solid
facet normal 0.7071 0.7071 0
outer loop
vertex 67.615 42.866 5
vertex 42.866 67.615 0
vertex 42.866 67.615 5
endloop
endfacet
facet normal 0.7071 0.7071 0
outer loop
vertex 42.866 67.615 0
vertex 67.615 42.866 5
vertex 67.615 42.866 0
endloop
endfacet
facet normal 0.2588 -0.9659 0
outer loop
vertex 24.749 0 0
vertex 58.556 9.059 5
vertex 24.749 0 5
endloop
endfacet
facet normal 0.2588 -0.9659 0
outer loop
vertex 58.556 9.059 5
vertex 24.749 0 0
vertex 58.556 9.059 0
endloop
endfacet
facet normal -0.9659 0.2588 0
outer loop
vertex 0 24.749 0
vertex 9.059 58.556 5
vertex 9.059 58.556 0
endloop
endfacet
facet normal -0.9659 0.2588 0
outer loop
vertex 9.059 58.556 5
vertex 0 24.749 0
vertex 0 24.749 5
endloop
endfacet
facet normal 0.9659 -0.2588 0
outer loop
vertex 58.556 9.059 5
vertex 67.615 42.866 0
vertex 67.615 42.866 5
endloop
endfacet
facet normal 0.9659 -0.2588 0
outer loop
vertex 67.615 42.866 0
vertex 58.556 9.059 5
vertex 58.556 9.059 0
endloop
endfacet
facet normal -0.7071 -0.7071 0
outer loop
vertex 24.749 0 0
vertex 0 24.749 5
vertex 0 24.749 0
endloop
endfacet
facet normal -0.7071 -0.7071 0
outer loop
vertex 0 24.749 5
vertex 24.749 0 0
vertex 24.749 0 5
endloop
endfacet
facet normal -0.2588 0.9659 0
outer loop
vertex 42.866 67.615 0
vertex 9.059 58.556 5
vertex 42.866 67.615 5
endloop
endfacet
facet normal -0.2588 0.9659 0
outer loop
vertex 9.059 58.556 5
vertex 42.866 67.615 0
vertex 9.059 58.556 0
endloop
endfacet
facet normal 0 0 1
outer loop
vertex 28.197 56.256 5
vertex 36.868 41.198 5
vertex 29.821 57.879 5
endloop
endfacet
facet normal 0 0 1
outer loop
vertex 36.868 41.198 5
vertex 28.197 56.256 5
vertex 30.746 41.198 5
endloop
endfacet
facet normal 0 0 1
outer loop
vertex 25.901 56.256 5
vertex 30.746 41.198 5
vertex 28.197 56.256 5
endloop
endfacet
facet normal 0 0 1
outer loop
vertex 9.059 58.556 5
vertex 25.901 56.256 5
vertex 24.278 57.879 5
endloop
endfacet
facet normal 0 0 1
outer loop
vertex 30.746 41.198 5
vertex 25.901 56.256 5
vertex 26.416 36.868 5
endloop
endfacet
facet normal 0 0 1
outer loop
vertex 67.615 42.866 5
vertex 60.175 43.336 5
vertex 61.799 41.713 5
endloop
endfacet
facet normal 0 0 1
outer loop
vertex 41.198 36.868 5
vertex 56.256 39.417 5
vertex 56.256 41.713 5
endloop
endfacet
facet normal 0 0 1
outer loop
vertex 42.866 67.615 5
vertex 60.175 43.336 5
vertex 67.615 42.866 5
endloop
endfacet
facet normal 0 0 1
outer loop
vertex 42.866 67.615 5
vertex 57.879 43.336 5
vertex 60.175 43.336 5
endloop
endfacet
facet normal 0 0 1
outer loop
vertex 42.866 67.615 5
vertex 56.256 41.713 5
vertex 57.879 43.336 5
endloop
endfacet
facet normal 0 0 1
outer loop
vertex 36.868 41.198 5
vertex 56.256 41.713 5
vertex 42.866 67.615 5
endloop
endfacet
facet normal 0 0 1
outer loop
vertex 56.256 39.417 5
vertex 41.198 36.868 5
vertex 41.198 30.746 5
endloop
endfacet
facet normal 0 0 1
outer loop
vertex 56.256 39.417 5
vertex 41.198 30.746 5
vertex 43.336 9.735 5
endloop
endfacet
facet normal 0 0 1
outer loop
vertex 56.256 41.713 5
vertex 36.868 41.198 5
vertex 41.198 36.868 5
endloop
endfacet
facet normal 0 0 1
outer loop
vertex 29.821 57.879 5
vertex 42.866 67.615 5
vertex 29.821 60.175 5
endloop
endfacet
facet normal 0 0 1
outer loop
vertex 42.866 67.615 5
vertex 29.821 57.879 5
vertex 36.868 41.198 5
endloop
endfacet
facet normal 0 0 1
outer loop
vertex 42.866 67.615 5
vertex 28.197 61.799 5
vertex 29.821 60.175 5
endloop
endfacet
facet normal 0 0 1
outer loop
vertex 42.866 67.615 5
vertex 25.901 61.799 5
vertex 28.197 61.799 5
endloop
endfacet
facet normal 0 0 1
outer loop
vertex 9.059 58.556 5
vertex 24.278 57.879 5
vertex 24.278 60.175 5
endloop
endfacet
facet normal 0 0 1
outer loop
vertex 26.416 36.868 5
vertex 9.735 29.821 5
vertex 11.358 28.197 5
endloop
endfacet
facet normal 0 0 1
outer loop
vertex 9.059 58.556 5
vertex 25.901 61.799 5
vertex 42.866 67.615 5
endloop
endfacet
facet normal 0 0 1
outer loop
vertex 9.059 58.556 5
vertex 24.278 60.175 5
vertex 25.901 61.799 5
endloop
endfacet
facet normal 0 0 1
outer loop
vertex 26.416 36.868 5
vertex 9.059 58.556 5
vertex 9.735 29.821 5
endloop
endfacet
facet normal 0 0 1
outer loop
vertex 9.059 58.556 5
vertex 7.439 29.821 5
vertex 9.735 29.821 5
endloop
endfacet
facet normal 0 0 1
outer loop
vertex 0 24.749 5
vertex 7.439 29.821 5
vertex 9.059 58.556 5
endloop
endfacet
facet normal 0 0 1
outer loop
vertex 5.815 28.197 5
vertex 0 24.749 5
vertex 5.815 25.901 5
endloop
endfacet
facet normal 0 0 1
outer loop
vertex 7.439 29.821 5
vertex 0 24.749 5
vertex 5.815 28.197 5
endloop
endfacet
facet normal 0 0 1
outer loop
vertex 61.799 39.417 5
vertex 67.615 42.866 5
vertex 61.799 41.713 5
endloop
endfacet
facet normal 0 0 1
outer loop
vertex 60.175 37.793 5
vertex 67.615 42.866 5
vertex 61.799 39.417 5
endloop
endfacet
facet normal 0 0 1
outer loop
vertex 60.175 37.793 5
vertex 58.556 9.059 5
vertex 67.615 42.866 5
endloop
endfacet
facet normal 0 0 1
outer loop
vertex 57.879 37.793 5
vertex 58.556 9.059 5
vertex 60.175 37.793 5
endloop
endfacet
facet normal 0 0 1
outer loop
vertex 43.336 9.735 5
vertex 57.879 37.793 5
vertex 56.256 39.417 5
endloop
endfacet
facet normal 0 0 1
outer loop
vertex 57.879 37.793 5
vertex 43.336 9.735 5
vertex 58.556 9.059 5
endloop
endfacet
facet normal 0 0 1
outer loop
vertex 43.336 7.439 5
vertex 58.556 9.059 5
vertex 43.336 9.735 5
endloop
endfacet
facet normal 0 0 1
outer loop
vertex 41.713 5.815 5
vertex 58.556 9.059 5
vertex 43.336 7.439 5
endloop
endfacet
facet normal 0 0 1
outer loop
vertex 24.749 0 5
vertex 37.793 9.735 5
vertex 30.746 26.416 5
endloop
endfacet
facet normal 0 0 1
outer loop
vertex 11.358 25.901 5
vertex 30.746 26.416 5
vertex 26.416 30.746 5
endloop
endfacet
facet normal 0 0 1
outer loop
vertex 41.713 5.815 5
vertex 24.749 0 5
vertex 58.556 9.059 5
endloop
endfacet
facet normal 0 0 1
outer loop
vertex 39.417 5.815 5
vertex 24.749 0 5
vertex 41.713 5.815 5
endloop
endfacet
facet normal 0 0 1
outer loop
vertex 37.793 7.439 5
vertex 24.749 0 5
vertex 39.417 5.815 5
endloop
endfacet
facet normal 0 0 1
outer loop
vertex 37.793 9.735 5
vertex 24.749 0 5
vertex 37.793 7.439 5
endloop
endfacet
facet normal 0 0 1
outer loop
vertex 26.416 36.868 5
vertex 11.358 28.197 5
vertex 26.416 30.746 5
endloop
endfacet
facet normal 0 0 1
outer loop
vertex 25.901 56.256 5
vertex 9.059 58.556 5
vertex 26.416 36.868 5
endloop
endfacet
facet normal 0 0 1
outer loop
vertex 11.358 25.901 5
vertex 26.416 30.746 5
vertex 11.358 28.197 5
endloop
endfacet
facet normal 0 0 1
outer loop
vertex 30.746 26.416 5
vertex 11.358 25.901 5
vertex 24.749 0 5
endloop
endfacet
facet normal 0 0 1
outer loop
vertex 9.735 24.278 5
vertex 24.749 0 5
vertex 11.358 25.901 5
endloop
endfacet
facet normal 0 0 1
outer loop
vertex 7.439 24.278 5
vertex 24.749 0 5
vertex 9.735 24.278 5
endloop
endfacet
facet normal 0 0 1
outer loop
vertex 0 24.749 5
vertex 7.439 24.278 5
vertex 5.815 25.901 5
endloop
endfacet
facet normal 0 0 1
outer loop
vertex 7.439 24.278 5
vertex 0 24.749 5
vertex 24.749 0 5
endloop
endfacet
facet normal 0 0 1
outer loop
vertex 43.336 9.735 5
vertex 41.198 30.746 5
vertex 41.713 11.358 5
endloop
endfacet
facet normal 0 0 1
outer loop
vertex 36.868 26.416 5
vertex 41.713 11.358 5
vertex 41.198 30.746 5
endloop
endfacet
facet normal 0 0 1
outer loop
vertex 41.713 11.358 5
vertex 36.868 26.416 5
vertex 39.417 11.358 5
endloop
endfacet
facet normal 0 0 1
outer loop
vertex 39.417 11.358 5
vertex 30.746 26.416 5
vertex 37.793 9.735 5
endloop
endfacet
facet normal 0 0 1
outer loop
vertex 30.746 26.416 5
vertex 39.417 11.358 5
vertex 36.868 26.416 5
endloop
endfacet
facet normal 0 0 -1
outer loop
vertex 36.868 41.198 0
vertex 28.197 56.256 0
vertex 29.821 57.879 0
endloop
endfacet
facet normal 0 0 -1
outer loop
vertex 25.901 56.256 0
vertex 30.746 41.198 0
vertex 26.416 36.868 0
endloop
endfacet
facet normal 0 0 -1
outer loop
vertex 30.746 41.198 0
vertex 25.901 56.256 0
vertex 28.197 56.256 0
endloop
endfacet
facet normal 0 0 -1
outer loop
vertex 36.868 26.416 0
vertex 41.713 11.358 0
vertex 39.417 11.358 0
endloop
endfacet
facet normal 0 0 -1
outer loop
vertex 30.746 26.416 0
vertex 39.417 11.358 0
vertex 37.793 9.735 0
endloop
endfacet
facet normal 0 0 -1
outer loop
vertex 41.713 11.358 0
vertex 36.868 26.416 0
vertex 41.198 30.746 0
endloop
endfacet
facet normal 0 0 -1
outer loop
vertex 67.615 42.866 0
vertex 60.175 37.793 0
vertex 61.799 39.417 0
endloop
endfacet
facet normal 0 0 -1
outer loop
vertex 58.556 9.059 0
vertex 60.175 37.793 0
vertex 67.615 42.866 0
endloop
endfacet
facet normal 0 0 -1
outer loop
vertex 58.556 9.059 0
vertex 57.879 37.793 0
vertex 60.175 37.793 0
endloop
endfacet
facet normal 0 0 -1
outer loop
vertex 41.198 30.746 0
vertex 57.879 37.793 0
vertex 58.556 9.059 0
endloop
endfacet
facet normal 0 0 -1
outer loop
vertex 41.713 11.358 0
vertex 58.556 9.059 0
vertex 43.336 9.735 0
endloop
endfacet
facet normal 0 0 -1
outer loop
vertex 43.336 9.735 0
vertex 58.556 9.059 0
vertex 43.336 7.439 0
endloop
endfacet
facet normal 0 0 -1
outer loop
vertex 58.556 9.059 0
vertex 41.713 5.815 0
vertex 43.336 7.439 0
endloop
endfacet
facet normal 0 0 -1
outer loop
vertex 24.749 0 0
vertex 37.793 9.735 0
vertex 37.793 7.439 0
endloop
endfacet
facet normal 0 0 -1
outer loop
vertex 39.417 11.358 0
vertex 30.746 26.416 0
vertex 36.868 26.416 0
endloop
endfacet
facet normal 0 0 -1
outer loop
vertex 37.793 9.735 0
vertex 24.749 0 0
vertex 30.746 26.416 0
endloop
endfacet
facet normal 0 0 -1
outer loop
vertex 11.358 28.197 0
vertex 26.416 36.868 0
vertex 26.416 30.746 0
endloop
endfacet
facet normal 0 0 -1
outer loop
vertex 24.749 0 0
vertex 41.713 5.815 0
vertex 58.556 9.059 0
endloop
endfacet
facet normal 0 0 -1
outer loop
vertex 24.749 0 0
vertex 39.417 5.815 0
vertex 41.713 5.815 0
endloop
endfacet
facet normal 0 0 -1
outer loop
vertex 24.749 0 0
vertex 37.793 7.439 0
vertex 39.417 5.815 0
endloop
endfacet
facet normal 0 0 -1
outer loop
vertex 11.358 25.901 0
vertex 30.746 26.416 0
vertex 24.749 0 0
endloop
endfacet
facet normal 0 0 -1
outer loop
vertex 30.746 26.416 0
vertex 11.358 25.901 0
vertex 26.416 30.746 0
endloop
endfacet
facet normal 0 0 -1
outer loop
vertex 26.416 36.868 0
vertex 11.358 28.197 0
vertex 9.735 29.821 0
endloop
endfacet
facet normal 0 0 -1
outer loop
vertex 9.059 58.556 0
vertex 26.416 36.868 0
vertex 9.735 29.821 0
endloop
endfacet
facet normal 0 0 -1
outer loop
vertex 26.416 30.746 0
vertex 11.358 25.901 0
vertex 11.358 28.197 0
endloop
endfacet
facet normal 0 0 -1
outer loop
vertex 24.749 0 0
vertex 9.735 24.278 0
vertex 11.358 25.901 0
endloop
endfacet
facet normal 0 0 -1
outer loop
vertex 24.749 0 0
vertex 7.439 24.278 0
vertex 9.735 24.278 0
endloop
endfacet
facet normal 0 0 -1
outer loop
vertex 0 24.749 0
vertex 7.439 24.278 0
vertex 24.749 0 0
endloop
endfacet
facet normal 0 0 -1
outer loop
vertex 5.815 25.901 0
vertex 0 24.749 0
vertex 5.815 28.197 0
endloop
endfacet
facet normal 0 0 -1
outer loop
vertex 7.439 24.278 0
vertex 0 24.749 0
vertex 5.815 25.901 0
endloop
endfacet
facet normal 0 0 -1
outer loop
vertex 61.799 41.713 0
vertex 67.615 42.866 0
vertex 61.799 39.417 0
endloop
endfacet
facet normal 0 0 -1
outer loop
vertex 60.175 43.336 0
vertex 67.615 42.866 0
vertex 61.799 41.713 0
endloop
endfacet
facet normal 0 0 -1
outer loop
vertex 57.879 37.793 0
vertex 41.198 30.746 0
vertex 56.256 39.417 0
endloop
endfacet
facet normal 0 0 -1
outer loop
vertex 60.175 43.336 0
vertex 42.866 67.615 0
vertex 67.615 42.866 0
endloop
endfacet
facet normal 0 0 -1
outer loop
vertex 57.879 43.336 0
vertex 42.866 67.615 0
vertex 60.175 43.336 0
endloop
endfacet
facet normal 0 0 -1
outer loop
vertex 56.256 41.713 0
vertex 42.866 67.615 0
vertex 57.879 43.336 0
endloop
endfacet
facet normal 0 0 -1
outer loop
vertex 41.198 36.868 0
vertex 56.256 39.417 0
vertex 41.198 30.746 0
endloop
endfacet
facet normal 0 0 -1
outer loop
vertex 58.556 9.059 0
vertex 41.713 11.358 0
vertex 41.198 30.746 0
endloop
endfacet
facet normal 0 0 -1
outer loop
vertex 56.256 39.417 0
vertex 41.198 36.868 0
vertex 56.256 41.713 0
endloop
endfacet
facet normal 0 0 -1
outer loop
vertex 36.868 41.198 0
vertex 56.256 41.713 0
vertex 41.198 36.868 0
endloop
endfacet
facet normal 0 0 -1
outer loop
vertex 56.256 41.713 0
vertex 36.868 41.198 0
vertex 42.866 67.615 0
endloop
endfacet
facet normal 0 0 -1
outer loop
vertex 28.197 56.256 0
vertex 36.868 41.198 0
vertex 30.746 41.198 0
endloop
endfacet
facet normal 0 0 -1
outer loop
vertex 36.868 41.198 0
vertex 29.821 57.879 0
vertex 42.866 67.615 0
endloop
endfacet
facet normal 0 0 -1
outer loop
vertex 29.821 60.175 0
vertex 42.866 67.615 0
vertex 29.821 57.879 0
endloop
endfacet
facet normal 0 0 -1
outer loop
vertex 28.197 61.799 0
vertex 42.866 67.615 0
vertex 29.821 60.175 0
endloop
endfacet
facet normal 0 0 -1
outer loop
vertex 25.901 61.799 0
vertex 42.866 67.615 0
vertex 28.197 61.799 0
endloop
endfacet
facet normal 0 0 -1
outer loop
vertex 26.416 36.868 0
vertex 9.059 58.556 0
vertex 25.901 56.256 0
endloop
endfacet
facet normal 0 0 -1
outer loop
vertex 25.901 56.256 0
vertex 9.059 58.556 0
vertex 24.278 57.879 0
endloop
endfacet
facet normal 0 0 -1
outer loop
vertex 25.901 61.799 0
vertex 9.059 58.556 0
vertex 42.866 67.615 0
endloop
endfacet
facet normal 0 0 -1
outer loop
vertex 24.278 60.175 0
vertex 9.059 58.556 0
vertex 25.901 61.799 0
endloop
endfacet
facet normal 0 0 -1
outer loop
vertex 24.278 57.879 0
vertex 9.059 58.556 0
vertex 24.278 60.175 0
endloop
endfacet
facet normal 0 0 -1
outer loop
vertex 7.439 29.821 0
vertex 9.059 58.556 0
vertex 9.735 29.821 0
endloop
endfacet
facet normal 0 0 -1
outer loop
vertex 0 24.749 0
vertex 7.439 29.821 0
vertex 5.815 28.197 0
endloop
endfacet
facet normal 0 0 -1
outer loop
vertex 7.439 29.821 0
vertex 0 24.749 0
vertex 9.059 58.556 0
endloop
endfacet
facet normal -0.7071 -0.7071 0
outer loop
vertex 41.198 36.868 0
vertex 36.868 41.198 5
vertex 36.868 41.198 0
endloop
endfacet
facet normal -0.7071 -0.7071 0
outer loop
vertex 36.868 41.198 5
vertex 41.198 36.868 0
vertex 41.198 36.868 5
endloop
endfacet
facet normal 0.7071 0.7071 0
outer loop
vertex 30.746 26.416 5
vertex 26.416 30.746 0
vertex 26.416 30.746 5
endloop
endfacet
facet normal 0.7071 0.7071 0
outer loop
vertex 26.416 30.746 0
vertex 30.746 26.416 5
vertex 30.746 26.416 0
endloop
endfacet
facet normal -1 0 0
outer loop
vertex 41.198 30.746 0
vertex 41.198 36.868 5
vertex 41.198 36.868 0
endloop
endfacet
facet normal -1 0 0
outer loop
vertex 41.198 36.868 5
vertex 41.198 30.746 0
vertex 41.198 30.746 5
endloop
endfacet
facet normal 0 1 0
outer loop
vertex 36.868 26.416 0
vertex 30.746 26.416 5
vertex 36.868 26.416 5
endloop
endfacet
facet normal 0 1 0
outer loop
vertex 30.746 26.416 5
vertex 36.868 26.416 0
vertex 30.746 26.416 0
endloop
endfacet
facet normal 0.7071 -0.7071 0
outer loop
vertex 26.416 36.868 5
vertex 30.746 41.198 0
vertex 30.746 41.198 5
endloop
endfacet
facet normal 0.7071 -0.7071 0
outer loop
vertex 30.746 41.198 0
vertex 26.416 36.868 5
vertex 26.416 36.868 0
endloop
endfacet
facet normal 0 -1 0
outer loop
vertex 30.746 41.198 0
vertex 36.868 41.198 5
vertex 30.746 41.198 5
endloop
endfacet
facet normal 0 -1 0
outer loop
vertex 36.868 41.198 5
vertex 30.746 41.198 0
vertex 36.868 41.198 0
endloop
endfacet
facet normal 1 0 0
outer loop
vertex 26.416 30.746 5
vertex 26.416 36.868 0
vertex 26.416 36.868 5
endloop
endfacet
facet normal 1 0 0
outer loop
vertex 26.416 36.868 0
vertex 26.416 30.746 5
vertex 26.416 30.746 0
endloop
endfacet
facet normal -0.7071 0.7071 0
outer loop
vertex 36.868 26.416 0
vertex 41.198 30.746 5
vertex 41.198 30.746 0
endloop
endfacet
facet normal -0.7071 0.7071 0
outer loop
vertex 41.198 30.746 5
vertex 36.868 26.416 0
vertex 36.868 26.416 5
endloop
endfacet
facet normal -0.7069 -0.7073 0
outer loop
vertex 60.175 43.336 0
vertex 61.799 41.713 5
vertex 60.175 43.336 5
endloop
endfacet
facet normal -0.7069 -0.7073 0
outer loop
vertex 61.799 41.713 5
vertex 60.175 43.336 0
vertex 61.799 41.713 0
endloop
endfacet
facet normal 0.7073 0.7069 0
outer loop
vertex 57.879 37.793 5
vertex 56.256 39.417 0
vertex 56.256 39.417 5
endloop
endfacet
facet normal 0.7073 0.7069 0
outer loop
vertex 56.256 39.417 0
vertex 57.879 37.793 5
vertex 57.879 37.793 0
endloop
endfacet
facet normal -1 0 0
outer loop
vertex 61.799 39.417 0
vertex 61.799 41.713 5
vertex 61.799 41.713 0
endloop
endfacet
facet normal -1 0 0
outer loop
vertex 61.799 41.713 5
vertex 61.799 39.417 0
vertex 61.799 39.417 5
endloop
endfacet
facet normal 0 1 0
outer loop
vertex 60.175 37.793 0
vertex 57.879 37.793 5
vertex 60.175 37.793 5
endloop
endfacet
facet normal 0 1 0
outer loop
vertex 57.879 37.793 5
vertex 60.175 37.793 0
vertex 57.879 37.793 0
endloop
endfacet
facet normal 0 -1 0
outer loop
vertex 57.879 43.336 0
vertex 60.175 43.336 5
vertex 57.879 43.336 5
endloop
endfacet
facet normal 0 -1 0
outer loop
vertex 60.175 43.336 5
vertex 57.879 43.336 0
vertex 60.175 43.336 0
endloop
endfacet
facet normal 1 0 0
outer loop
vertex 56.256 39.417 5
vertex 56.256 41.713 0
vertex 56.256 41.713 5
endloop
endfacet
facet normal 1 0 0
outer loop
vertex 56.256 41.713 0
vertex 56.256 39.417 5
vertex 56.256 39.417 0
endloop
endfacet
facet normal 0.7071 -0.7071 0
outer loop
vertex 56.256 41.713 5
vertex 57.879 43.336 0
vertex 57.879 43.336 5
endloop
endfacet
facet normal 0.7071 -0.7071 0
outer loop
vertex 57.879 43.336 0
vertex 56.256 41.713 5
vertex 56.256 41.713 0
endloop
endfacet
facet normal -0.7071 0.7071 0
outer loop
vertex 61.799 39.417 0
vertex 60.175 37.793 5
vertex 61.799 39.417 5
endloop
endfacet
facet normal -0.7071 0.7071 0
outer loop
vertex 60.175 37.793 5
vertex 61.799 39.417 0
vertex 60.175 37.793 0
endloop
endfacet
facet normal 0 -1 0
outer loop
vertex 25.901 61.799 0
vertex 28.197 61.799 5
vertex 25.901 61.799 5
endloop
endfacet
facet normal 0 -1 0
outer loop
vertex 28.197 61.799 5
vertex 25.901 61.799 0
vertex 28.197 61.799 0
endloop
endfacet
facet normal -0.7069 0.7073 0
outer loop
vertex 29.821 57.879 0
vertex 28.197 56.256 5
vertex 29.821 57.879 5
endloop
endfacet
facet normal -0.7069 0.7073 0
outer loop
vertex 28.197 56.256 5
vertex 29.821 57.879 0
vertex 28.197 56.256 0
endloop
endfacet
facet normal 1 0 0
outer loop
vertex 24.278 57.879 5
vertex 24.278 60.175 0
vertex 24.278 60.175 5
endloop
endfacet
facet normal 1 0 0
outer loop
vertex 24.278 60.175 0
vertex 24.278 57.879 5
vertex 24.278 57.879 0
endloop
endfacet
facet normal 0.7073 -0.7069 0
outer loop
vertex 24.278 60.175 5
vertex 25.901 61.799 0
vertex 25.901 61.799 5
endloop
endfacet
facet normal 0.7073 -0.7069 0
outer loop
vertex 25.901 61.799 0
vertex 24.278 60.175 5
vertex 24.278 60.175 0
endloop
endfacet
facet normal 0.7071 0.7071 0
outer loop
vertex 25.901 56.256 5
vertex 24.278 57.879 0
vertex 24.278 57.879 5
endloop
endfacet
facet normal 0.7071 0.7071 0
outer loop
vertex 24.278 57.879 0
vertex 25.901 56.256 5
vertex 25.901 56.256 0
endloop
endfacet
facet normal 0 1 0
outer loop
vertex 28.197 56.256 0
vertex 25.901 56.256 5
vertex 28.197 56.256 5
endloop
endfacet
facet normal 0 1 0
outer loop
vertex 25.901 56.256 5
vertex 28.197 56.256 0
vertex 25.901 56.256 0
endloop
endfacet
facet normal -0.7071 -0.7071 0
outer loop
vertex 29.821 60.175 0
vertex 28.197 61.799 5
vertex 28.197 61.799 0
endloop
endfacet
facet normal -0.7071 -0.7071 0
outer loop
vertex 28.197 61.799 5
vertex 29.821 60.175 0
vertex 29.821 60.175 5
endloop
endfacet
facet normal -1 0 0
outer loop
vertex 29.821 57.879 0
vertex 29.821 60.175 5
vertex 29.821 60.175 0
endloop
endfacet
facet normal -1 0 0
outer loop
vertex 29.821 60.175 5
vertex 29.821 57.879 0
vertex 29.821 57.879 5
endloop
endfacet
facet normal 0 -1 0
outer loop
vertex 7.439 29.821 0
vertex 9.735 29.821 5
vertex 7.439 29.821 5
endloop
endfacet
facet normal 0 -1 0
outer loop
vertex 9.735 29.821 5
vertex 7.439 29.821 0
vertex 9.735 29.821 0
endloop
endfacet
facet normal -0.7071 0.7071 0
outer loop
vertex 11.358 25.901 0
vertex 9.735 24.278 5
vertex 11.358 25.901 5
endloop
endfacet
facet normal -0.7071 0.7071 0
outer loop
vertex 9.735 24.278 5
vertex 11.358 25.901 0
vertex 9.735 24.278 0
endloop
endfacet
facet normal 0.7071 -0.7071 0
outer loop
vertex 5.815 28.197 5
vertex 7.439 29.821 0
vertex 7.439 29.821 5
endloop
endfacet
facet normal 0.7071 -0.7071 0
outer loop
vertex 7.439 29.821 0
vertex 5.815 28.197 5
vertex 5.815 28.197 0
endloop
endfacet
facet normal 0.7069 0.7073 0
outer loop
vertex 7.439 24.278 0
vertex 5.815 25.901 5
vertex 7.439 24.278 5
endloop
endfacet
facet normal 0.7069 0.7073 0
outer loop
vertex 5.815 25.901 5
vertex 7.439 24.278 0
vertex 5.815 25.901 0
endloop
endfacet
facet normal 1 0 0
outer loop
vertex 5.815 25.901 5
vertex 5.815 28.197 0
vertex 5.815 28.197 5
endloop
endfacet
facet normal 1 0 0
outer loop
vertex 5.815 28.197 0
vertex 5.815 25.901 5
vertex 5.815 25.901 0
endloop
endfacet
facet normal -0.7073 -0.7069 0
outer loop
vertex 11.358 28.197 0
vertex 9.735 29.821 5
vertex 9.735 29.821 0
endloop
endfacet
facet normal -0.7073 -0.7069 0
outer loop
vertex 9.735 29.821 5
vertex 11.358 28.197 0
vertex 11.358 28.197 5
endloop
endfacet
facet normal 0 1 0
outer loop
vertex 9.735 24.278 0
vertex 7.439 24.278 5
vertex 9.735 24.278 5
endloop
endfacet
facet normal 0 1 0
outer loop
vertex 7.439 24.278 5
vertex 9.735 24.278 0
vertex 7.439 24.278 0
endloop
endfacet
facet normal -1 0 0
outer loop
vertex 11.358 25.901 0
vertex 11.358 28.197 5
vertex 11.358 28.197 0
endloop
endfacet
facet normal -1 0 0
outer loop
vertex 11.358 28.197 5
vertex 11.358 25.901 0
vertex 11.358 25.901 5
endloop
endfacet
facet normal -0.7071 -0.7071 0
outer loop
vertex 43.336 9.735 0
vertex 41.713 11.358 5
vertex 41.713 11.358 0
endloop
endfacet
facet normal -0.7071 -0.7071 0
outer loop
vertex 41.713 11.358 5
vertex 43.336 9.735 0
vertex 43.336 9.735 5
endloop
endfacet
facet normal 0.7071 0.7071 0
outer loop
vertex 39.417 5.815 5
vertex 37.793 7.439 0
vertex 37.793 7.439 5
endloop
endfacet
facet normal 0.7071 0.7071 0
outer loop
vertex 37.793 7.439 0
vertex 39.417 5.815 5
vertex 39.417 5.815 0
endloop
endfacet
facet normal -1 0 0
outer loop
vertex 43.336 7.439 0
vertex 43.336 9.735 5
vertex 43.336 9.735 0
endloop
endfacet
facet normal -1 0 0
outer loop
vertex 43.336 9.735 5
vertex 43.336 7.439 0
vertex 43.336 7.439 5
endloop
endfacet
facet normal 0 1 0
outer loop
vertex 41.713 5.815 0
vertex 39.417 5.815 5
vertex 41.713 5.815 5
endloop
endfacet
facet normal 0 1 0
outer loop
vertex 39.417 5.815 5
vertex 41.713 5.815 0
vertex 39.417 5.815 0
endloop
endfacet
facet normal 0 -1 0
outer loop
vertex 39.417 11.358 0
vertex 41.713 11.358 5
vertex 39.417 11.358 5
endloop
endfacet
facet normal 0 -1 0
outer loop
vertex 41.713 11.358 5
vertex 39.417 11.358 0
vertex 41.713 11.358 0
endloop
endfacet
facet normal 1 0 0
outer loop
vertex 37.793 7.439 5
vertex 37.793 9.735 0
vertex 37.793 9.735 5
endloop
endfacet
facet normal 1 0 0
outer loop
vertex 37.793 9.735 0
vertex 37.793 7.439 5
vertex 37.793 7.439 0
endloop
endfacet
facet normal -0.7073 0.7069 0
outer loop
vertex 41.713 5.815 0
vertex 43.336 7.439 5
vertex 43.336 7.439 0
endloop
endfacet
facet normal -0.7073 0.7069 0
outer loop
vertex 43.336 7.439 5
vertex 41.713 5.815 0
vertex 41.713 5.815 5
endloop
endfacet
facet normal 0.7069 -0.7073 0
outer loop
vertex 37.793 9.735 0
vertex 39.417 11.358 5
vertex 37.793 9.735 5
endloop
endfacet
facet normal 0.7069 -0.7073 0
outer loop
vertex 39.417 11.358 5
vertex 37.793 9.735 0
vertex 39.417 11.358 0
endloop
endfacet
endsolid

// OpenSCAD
$fn = 32;

// ----------------------------------------------------------------------
// Polygon plate: 6-gon R35, 4 bolt windows
// ----------------------------------------------------------------------

// --- parameters (mm) ---
sides = 6;                // number of polygon sides
plate_r = 35;             // circumscribed radius of the polygon
bore_r = 8;               // centre bore radius
bolts = 4;                // number of bolt windows
ring_r = 26.11;           // bolt-circle radius
bolt_r = 3;               // bolt window radius
plate_t = 5;              // plate thickness, Z (extrusion height)

plate_d = 2 * plate_r;  // circumscribed diameter
bore_d = 2 * bore_r;  // centre bore diameter
bolt_d = 2 * bolt_r;  // bolt window diameter
ring_d = 2 * ring_r;  // bolt-circle diameter

profile = [[67.615, 42.866], [42.866, 67.615], [9.059, 58.556], [0, 24.749], [24.749, 0], [58.556, 9.059]];  // primary outline, 6 points, counter clockwise
void_1 = [[41.198, 36.868], [36.868, 41.198], [30.746, 41.198], [26.416, 36.868], [26.416, 30.746], [30.746, 26.416], [36.868, 26.416], [41.198, 30.746]];  // centre bore, 8 points
void_2 = [[61.799, 41.713], [60.175, 43.336], [57.879, 43.336], [56.256, 41.713], [56.256, 39.417], [57.879, 37.793], [60.175, 37.793], [61.799, 39.417]];  // bolt window 1, 8 points
void_3 = [[29.821, 60.175], [28.197, 61.799], [25.901, 61.799], [24.278, 60.175], [24.278, 57.879], [25.901, 56.256], [28.197, 56.256], [29.821, 57.879]];  // bolt window 2, 8 points
void_4 = [[11.358, 28.197], [9.735, 29.821], [7.439, 29.821], [5.815, 28.197], [5.815, 25.901], [7.439, 24.278], [9.735, 24.278], [11.358, 25.901]];  // bolt window 3, 8 points
void_5 = [[43.336, 9.735], [41.713, 11.358], [39.417, 11.358], [37.793, 9.735], [37.793, 7.439], [39.417, 5.815], [41.713, 5.815], [43.336, 7.439]];  // bolt window 4, 8 points

// --- the one profile operation ---
difference() {
  linear_extrude(height = plate_t) polygon(points = profile);
  translate([0, 0, -1])
    linear_extrude(height = plate_t + 2) polygon(points = void_1);
  translate([0, 0, -1])
    linear_extrude(height = plate_t + 2) polygon(points = void_2);
  translate([0, 0, -1])
    linear_extrude(height = plate_t + 2) polygon(points = void_3);
  translate([0, 0, -1])
    linear_extrude(height = plate_t + 2) polygon(points = void_4);
  translate([0, 0, -1])
    linear_extrude(height = plate_t + 2) polygon(points = void_5);
}
